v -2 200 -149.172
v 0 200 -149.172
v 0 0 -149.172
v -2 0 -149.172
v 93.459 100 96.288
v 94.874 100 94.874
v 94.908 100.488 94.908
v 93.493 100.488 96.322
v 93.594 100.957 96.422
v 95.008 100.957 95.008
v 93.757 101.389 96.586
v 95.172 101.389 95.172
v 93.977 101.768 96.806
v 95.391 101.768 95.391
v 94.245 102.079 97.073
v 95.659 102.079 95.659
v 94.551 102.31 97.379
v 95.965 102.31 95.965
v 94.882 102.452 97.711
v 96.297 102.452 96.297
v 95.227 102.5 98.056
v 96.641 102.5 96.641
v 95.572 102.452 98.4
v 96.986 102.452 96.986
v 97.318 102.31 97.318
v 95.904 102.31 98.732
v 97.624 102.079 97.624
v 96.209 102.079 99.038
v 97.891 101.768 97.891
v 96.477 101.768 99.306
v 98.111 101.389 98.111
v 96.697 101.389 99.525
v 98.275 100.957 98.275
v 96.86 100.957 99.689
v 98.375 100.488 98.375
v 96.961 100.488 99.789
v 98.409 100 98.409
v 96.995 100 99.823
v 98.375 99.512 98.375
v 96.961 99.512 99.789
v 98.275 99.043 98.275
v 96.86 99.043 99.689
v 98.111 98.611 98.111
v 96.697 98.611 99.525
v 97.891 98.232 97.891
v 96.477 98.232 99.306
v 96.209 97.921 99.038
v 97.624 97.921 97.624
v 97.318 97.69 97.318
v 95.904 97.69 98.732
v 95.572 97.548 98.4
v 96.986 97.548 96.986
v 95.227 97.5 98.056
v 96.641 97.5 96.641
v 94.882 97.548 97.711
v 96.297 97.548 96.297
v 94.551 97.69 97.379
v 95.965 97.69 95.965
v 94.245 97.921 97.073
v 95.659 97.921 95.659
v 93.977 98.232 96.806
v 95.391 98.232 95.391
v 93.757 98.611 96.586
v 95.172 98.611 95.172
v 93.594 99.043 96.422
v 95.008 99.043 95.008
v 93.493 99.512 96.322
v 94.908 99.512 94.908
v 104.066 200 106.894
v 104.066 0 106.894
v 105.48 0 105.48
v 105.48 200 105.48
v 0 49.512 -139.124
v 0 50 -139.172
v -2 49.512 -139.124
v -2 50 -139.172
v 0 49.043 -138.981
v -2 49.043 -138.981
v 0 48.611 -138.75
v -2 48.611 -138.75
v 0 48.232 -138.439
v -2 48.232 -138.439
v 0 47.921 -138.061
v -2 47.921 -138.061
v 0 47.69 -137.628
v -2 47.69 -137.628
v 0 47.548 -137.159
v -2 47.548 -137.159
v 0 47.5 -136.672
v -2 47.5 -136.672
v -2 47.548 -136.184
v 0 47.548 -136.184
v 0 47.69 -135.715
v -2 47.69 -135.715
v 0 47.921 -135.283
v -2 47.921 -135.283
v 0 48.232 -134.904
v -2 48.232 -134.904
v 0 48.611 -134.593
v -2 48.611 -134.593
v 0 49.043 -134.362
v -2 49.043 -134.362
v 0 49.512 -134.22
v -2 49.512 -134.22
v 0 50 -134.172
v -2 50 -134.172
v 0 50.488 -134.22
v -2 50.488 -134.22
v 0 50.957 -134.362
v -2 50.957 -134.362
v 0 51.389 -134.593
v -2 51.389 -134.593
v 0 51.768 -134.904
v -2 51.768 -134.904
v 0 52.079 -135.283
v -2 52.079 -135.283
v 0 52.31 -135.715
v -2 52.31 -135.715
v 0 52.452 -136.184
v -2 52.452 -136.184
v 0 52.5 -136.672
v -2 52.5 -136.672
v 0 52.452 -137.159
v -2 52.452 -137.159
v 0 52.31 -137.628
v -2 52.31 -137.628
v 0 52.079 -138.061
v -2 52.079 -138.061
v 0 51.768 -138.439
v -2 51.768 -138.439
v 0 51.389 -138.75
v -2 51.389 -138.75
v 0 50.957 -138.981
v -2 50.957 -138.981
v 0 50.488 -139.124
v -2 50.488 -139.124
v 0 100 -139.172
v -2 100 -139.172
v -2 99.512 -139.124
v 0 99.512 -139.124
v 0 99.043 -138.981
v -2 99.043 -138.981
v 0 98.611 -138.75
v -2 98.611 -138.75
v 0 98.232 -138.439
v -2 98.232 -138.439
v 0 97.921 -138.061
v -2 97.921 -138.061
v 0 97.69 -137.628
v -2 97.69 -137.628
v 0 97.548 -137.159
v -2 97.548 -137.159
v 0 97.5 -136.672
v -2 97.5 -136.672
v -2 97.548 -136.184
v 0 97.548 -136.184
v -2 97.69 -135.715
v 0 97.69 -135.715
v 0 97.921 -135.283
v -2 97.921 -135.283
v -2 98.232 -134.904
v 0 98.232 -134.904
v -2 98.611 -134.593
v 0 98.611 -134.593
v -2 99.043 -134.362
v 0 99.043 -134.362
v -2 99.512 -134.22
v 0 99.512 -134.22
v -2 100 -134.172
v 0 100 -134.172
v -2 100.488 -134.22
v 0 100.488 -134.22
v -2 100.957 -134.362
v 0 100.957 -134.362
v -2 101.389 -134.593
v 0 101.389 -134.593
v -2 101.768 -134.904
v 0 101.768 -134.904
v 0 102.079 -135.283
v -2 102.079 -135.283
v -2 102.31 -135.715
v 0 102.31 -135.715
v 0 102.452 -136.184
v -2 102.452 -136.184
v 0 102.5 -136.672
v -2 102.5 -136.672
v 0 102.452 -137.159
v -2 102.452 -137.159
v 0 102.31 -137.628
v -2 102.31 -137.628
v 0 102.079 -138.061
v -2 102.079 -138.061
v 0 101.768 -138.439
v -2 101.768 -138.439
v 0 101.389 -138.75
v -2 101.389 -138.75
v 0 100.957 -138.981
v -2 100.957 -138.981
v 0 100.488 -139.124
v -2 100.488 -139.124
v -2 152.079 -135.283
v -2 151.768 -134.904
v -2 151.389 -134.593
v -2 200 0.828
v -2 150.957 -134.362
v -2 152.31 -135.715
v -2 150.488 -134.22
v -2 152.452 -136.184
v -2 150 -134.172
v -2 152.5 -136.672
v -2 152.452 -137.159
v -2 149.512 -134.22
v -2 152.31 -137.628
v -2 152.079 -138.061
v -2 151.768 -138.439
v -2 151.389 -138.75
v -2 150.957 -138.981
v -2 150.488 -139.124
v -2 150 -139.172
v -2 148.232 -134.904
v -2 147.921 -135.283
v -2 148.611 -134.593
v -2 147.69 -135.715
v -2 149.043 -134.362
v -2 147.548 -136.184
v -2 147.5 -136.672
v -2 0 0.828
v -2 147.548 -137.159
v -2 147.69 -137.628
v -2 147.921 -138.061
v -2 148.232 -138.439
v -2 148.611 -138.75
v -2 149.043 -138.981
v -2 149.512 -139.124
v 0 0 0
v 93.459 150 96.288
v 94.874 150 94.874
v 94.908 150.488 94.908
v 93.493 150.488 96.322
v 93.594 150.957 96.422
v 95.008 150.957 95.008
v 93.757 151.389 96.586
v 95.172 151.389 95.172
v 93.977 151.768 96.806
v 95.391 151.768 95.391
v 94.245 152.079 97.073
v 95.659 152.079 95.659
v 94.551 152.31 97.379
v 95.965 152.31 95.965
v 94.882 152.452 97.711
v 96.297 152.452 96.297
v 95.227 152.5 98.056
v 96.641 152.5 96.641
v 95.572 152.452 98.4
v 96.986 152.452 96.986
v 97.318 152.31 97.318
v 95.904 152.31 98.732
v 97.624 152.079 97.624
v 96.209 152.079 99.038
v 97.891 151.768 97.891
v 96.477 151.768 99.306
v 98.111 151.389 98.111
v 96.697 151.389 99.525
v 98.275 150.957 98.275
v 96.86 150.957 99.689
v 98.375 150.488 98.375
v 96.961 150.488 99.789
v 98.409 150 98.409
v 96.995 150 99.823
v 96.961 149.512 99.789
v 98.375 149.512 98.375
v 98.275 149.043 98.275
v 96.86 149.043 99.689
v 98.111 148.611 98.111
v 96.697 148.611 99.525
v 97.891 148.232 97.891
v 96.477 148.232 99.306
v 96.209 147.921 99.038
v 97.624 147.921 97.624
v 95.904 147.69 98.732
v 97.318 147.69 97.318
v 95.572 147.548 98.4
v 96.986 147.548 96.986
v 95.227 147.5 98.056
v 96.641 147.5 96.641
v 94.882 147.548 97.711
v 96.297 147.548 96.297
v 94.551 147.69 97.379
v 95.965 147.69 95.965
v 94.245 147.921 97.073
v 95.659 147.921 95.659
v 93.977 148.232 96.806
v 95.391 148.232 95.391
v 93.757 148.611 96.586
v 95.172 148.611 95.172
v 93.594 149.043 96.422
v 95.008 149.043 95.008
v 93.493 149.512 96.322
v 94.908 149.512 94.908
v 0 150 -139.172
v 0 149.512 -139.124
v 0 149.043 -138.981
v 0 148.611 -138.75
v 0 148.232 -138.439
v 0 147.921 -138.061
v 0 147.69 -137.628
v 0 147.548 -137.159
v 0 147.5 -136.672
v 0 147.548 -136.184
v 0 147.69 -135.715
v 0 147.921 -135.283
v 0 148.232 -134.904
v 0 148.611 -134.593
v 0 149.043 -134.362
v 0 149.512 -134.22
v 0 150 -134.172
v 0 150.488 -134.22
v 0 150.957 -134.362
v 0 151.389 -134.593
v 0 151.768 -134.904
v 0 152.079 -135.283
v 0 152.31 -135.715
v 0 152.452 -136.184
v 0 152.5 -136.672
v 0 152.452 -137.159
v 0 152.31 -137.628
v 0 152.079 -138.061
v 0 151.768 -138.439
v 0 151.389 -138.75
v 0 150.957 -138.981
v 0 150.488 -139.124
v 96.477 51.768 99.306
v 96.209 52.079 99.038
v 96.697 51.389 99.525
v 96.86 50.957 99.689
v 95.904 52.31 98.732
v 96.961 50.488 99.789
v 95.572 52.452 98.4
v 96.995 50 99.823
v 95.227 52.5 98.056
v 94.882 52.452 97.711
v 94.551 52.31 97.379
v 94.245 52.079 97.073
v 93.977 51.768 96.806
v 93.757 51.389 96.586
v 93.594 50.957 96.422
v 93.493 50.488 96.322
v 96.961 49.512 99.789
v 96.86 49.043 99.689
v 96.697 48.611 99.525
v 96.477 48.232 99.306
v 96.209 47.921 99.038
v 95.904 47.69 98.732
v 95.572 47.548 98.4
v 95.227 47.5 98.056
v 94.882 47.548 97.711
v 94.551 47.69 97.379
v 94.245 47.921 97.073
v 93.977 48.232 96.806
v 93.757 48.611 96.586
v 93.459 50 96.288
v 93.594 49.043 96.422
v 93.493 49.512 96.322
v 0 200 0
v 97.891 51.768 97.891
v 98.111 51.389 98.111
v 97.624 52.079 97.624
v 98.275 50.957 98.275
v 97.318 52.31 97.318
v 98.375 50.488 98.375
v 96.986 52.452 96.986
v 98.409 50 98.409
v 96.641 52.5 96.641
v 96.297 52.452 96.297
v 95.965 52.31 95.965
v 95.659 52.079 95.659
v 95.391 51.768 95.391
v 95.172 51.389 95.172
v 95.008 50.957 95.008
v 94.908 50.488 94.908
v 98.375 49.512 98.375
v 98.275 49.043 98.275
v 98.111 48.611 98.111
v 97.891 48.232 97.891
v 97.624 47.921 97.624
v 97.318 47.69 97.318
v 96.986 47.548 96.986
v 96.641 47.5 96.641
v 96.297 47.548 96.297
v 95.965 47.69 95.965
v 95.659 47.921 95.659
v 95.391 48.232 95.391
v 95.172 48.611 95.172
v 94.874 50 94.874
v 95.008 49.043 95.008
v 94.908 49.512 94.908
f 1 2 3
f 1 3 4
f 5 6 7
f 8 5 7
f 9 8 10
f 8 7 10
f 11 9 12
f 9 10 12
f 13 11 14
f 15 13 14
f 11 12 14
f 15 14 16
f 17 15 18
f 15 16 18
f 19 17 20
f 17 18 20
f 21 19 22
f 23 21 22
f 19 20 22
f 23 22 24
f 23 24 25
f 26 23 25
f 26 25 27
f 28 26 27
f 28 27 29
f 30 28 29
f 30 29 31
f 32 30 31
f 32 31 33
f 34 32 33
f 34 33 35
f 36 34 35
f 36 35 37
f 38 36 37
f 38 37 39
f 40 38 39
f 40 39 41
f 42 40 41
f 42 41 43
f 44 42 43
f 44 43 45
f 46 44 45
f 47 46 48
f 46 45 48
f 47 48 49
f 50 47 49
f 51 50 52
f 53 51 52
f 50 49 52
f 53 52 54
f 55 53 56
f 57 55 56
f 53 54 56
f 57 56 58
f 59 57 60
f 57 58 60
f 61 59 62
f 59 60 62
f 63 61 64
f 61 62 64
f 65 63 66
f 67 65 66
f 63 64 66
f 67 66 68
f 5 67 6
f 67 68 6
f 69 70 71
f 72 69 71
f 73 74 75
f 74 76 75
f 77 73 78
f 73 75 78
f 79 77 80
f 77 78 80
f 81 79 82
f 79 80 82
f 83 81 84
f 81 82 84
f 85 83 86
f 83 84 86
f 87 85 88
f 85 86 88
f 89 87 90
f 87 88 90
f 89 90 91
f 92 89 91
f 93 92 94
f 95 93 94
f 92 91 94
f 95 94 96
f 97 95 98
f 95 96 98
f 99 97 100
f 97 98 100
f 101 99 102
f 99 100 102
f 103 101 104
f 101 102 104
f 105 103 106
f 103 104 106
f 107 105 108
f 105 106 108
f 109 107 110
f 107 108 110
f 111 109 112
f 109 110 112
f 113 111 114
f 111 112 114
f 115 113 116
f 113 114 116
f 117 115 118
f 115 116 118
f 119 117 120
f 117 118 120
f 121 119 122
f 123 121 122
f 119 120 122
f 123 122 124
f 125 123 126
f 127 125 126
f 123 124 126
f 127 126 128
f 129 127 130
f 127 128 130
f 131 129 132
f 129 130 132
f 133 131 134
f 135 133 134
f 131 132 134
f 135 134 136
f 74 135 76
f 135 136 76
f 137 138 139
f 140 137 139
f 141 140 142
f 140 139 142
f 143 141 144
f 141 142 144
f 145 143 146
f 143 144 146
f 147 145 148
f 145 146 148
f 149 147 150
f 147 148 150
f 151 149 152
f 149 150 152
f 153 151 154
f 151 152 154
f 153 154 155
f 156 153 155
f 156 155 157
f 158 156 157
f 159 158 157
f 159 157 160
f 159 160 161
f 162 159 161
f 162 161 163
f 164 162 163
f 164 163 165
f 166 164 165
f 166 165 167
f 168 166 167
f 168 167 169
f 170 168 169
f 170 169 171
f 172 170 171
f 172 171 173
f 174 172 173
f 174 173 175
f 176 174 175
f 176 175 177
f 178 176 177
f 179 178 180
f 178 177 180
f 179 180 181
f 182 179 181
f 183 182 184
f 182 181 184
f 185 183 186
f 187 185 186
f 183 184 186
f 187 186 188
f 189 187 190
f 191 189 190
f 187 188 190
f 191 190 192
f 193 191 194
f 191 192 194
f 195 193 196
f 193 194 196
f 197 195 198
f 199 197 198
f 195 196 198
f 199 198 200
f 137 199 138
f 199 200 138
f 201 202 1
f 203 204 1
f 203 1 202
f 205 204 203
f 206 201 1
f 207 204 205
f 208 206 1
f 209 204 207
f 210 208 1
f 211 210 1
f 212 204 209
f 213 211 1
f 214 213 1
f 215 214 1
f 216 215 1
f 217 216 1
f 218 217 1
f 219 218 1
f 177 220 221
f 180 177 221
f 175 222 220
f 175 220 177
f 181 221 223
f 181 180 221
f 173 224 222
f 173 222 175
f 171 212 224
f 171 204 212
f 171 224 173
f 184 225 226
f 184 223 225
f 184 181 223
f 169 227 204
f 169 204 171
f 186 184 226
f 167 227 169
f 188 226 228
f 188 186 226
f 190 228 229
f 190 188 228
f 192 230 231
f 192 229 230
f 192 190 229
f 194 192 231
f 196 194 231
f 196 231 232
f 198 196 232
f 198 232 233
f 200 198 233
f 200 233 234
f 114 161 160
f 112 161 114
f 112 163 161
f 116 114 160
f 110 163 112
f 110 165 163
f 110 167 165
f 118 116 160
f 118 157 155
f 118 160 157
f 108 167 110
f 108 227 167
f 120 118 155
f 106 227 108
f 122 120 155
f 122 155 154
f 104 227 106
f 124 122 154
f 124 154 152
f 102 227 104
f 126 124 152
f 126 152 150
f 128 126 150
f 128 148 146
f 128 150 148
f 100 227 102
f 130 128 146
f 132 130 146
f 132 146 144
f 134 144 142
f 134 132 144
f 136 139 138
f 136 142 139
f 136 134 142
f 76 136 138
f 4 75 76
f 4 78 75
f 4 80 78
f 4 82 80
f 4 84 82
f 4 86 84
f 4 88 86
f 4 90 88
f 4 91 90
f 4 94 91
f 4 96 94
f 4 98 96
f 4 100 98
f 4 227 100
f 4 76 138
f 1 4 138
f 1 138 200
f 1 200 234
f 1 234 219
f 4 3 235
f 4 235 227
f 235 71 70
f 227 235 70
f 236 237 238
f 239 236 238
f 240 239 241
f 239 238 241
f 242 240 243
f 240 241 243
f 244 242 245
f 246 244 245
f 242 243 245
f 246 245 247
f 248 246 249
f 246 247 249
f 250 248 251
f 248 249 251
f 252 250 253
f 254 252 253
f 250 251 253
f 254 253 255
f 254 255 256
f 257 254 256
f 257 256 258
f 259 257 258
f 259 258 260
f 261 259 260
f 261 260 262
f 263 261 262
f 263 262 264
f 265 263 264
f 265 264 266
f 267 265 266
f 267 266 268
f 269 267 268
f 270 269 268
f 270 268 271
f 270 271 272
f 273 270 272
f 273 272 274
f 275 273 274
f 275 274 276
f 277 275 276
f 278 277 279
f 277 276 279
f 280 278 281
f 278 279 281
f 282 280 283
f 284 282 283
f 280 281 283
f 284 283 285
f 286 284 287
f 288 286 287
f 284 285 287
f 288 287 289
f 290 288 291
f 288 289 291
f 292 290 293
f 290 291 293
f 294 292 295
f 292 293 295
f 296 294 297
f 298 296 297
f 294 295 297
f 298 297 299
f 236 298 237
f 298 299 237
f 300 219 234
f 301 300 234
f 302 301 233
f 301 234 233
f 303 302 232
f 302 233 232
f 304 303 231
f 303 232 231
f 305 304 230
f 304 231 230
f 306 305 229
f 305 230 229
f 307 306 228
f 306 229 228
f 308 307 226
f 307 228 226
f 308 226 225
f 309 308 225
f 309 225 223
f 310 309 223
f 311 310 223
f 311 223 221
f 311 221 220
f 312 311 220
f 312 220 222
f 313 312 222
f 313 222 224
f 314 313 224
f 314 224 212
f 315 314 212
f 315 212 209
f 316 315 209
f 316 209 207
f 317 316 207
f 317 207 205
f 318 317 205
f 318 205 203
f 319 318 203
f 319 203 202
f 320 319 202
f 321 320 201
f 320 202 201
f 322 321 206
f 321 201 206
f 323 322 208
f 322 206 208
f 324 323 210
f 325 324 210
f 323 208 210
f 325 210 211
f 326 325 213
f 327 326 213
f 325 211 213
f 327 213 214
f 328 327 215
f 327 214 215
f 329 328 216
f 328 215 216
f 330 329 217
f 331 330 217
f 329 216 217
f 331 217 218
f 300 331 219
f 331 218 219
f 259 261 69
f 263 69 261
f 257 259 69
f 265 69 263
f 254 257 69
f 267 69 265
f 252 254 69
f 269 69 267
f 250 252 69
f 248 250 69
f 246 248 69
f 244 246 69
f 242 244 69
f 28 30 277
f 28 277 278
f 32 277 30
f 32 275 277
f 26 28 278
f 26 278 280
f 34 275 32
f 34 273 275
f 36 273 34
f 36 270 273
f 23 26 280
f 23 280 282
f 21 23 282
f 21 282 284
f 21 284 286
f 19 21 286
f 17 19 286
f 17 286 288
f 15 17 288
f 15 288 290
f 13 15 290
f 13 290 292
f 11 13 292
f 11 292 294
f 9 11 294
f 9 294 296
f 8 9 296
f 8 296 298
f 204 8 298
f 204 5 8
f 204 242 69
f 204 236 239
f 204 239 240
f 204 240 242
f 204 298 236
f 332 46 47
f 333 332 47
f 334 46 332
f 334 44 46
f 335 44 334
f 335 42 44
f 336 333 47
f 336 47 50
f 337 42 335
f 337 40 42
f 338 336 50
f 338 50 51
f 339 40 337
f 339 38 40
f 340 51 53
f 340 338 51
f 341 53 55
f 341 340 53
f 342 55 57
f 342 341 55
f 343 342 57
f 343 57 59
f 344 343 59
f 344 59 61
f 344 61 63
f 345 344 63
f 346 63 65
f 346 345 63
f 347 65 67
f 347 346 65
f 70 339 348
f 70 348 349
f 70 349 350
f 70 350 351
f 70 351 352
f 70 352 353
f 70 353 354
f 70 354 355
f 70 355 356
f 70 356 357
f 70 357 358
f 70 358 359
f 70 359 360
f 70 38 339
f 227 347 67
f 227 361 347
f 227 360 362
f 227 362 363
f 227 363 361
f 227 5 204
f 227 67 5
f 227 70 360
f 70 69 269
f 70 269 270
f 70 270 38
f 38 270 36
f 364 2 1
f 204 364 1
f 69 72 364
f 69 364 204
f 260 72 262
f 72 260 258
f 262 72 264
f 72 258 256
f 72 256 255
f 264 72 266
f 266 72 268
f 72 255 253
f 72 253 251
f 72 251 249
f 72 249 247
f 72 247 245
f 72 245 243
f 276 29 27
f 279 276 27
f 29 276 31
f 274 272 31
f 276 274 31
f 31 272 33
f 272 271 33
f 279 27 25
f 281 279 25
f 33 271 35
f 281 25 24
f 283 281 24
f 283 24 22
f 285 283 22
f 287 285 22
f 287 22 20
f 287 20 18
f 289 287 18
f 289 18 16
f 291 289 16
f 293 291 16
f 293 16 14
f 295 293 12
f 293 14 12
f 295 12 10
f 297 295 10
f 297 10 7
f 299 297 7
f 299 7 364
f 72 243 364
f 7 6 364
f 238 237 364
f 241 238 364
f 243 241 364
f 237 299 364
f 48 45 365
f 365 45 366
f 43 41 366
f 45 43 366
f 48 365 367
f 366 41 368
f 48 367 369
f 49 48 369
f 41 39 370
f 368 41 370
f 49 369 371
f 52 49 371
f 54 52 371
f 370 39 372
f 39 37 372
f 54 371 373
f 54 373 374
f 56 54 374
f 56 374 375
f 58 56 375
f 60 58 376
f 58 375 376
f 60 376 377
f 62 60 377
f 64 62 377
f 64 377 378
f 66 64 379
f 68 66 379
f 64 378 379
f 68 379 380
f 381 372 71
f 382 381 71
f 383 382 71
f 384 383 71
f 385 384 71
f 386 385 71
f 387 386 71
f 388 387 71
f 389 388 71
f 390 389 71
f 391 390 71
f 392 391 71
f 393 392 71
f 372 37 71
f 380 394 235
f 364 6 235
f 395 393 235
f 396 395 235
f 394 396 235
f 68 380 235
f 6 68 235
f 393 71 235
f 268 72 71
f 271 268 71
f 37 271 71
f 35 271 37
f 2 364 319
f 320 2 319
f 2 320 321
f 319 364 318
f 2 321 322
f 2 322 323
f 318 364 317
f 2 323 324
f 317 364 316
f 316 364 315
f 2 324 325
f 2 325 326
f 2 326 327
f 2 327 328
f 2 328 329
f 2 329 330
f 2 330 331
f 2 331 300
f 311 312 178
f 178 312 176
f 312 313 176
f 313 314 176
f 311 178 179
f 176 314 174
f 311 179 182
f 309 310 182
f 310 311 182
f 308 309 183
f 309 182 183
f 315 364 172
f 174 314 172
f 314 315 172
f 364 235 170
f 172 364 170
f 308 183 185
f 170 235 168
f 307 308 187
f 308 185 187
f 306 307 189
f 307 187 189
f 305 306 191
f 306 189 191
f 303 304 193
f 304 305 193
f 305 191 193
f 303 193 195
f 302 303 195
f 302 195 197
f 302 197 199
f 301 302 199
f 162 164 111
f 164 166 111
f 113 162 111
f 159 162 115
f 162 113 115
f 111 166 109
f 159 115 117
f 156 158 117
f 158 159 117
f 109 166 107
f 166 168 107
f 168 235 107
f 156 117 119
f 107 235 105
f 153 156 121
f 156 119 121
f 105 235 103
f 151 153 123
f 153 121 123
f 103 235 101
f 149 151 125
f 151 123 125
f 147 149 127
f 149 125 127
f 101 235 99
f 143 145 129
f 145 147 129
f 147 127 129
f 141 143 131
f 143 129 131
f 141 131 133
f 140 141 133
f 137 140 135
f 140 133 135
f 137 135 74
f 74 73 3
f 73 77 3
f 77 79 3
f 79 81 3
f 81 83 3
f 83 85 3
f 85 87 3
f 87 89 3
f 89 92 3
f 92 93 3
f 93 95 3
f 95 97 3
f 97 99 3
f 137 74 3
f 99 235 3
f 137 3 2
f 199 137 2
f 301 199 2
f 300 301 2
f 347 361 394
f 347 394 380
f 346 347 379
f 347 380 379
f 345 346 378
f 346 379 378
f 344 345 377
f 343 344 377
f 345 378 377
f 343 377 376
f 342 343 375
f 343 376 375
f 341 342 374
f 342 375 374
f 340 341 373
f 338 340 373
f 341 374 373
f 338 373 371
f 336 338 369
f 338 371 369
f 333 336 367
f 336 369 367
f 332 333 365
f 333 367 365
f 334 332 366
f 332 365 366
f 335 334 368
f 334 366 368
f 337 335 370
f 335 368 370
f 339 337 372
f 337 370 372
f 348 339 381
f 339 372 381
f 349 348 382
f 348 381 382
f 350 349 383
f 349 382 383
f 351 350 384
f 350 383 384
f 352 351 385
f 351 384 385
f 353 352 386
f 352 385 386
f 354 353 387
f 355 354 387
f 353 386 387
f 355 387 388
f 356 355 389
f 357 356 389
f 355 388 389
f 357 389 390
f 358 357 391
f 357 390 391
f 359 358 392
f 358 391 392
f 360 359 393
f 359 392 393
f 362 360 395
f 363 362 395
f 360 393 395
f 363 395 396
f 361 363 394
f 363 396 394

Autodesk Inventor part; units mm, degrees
ref_plane "YZ Plane" through (0, 0, 0) normal (1, 0, 0) x (0, 1, 0)
ref_plane "XZ Plane" through (0, 0, 0) normal (0, 1, 0) x (-1, 0, 0)
ref_plane "XY Plane" through (0, 0, 0) normal (0, 0, 1) x (1, 0, 0)
sketch "Sketch2" plane through (0, 0, 0) normal (0, 1, 0) x (-1, 0, 0)
  line L0 (0, 0) -> (0, -149.1716)
  line L1 (-105.4802, 105.4802) -> (0, 0)
  line L2 (2, 0.8284) -> (2, -149.1716)
  line L3 (-104.066, 106.8944) -> (2, 0.8284)
  line L4 (-104.066, 106.8944) -> (-105.4802, 105.4802)
  line L5 (0, -149.1716) -> (2, -149.1716)
  line L6 (0, -200.3848) -> (0, 158.1076) projected
  dimension "d2" = 0
  dimension "d5" = 2
  dimension "d6" = 2
  dimension "d7" = 135
  dimension "d8" = 135
  dimension "d9" = 150
  dimension "d10" = 150
  dimension "d42" = 149.1716
  dimension "d43" = 149.1716
extrude "Extrusion1" add sketch "Sketch2" along normal blind 200
sketch "Sketch3" plane through (0, 0, 0) normal (0.7071, 0, -0.7071) x (-0.7071, 0, -0.7071)
  circle A0 centre (-136.6716, 50) radius 2.5
  line L0 (-149.1716, 0) -> (-149.1716, 200) projected
  line L1 (-149.1716, 0) -> (0, 0) projected
  circle A1 centre (-136.6716, 100) radius 2.5
  circle A2 centre (-136.6716, 150) radius 2.5
  line L2 (-149.1716, 200) -> (0, 200) projected
  dimension "d11" = 12.5
  dimension "d13" = 5
  dimension "d14" = 5
  dimension "d16" = 5
  dimension "d17" = 12.5
  dimension "d19" = 12.5
  dimension "d20" = 50
  dimension "d21" = 50
  dimension "d24" = 50
  dimension "d25" = 50
extrude "Extrusion2" cut sketch "Sketch3" against normal blind 3
sketch "Sketch4" plane through (0, 0, 0) normal (1, 0, 0) x (0, 0, -1)
  line L0 (149.1716, 0) -> (149.1716, 200) projected
  line L1 (0, 200) -> (149.1716, 200) projected
  line L2 (0, 0) -> (149.1716, 0) projected
  point P0 (136.6716, 150)
  point P1 (136.6716, 100)
  point P2 (136.6716, 50)
  dimension "d28" = 12.5
  dimension "d29" = 12.5
  dimension "d30" = 12.5
  dimension "d31" = 50
  dimension "d32" = 50
  dimension "d33" = 50
  dimension "d34" = 50
hole "Hole1" at (0, 150, -136.6716) at (0, 100, -136.6716) at (0, 50, -136.6716) direction (-1, 0, 0) diameter 5 end through all
properties part number "Thesis_part"
